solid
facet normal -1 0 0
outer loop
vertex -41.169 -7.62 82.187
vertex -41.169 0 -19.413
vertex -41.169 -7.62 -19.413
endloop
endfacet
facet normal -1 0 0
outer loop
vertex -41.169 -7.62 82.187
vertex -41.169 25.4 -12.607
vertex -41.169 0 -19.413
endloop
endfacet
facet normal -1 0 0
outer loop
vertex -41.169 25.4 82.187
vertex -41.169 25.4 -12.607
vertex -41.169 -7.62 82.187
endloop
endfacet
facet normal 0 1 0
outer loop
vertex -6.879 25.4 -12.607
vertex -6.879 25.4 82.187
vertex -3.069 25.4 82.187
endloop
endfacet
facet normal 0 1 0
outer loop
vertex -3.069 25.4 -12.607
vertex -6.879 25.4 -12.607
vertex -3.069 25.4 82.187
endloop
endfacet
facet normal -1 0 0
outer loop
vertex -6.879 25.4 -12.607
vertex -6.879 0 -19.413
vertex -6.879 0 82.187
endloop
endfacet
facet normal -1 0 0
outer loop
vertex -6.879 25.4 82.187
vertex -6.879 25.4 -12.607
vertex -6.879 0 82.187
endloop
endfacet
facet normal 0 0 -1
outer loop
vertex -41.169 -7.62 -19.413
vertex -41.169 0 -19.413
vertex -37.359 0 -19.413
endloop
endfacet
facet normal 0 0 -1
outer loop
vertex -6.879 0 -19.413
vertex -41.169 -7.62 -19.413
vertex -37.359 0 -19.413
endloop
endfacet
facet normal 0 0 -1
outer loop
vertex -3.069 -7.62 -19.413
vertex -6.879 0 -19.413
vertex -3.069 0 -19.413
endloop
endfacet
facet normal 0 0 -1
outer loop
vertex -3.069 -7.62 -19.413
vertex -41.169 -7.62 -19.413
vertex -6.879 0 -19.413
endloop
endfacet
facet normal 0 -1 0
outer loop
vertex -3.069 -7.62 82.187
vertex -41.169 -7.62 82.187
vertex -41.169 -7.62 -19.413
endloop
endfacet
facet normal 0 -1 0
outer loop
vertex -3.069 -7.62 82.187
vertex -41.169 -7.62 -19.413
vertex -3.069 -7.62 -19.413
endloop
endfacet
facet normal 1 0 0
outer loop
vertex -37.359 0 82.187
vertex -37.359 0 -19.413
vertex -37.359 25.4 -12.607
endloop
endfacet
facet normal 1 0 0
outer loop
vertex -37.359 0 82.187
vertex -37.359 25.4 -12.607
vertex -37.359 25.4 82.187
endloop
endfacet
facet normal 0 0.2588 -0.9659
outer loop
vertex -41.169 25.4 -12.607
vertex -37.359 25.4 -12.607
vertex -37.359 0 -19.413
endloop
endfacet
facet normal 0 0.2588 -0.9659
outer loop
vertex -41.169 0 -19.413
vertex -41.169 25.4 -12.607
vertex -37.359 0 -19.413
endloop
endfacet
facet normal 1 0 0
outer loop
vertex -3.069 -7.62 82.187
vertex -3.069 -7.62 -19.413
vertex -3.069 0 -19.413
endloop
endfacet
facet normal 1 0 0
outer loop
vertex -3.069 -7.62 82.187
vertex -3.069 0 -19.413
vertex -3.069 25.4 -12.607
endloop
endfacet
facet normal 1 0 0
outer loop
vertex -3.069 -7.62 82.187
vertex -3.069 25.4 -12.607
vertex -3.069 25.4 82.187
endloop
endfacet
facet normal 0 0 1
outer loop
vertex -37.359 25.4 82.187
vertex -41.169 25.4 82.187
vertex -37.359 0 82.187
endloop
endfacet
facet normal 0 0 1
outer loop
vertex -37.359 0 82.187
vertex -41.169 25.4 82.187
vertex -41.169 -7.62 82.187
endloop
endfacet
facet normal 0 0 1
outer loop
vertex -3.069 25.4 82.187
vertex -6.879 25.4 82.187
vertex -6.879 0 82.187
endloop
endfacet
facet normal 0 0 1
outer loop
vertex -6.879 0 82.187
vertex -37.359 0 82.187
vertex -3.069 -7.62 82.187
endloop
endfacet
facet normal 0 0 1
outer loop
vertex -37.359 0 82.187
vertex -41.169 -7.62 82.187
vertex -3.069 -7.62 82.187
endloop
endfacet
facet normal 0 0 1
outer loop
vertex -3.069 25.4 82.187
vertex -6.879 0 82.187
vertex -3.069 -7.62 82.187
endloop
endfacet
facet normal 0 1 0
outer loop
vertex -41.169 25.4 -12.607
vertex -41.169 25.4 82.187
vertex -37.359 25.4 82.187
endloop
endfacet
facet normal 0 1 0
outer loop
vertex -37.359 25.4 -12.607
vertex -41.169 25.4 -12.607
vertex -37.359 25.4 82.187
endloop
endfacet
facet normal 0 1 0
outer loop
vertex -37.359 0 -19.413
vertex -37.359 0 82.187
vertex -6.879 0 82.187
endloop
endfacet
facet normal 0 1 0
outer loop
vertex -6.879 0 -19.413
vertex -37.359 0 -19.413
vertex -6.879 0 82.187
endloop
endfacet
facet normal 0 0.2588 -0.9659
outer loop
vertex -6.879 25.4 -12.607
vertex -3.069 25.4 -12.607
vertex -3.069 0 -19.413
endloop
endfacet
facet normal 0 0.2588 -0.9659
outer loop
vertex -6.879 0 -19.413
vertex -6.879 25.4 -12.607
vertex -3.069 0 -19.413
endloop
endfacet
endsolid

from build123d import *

# Parameters (mm, degrees)
F0_W     = 30.48
F0_H     = 101.6
F0_W_2   = 3.81
F1_DEPTH = 7.62
F2_DEPTH = 25.4
F4_DEPTH = 50.8


with BuildPart() as f1:
    # F0 (on Front) → F1 (new body)
    with BuildSketch(Plane.XZ):
        with Locations((-22.118616, 31.387416)):
            Rectangle(F0_W, F0_H)
        with Locations((-39.263616, 31.387416)):
            Rectangle(F0_W_2, F0_H)
        with Locations((-4.973616, 31.387416)):
            Rectangle(F0_W_2, F0_H)
    extrude(amount=F1_DEPTH)

    # F0 (on Front) → F2 (join)
    with BuildSketch(Plane.XZ):
        with Locations((-4.973616, 31.387416)):
            Rectangle(F0_W_2, F0_H)
        with Locations((-39.263616, 31.387416)):
            Rectangle(F0_W_2, F0_H)
    extrude(amount=-F2_DEPTH)

    # F3 (on face) → F4 (cut)
    with BuildSketch(Plane.YZ.offset(-3.068616)):
        Polygon((25.4, -19.412584), (25.4, -12.606675), (0, -19.412584), align=None)
    extrude(amount=-F4_DEPTH, mode=Mode.SUBTRACT)


solid = f1.part
